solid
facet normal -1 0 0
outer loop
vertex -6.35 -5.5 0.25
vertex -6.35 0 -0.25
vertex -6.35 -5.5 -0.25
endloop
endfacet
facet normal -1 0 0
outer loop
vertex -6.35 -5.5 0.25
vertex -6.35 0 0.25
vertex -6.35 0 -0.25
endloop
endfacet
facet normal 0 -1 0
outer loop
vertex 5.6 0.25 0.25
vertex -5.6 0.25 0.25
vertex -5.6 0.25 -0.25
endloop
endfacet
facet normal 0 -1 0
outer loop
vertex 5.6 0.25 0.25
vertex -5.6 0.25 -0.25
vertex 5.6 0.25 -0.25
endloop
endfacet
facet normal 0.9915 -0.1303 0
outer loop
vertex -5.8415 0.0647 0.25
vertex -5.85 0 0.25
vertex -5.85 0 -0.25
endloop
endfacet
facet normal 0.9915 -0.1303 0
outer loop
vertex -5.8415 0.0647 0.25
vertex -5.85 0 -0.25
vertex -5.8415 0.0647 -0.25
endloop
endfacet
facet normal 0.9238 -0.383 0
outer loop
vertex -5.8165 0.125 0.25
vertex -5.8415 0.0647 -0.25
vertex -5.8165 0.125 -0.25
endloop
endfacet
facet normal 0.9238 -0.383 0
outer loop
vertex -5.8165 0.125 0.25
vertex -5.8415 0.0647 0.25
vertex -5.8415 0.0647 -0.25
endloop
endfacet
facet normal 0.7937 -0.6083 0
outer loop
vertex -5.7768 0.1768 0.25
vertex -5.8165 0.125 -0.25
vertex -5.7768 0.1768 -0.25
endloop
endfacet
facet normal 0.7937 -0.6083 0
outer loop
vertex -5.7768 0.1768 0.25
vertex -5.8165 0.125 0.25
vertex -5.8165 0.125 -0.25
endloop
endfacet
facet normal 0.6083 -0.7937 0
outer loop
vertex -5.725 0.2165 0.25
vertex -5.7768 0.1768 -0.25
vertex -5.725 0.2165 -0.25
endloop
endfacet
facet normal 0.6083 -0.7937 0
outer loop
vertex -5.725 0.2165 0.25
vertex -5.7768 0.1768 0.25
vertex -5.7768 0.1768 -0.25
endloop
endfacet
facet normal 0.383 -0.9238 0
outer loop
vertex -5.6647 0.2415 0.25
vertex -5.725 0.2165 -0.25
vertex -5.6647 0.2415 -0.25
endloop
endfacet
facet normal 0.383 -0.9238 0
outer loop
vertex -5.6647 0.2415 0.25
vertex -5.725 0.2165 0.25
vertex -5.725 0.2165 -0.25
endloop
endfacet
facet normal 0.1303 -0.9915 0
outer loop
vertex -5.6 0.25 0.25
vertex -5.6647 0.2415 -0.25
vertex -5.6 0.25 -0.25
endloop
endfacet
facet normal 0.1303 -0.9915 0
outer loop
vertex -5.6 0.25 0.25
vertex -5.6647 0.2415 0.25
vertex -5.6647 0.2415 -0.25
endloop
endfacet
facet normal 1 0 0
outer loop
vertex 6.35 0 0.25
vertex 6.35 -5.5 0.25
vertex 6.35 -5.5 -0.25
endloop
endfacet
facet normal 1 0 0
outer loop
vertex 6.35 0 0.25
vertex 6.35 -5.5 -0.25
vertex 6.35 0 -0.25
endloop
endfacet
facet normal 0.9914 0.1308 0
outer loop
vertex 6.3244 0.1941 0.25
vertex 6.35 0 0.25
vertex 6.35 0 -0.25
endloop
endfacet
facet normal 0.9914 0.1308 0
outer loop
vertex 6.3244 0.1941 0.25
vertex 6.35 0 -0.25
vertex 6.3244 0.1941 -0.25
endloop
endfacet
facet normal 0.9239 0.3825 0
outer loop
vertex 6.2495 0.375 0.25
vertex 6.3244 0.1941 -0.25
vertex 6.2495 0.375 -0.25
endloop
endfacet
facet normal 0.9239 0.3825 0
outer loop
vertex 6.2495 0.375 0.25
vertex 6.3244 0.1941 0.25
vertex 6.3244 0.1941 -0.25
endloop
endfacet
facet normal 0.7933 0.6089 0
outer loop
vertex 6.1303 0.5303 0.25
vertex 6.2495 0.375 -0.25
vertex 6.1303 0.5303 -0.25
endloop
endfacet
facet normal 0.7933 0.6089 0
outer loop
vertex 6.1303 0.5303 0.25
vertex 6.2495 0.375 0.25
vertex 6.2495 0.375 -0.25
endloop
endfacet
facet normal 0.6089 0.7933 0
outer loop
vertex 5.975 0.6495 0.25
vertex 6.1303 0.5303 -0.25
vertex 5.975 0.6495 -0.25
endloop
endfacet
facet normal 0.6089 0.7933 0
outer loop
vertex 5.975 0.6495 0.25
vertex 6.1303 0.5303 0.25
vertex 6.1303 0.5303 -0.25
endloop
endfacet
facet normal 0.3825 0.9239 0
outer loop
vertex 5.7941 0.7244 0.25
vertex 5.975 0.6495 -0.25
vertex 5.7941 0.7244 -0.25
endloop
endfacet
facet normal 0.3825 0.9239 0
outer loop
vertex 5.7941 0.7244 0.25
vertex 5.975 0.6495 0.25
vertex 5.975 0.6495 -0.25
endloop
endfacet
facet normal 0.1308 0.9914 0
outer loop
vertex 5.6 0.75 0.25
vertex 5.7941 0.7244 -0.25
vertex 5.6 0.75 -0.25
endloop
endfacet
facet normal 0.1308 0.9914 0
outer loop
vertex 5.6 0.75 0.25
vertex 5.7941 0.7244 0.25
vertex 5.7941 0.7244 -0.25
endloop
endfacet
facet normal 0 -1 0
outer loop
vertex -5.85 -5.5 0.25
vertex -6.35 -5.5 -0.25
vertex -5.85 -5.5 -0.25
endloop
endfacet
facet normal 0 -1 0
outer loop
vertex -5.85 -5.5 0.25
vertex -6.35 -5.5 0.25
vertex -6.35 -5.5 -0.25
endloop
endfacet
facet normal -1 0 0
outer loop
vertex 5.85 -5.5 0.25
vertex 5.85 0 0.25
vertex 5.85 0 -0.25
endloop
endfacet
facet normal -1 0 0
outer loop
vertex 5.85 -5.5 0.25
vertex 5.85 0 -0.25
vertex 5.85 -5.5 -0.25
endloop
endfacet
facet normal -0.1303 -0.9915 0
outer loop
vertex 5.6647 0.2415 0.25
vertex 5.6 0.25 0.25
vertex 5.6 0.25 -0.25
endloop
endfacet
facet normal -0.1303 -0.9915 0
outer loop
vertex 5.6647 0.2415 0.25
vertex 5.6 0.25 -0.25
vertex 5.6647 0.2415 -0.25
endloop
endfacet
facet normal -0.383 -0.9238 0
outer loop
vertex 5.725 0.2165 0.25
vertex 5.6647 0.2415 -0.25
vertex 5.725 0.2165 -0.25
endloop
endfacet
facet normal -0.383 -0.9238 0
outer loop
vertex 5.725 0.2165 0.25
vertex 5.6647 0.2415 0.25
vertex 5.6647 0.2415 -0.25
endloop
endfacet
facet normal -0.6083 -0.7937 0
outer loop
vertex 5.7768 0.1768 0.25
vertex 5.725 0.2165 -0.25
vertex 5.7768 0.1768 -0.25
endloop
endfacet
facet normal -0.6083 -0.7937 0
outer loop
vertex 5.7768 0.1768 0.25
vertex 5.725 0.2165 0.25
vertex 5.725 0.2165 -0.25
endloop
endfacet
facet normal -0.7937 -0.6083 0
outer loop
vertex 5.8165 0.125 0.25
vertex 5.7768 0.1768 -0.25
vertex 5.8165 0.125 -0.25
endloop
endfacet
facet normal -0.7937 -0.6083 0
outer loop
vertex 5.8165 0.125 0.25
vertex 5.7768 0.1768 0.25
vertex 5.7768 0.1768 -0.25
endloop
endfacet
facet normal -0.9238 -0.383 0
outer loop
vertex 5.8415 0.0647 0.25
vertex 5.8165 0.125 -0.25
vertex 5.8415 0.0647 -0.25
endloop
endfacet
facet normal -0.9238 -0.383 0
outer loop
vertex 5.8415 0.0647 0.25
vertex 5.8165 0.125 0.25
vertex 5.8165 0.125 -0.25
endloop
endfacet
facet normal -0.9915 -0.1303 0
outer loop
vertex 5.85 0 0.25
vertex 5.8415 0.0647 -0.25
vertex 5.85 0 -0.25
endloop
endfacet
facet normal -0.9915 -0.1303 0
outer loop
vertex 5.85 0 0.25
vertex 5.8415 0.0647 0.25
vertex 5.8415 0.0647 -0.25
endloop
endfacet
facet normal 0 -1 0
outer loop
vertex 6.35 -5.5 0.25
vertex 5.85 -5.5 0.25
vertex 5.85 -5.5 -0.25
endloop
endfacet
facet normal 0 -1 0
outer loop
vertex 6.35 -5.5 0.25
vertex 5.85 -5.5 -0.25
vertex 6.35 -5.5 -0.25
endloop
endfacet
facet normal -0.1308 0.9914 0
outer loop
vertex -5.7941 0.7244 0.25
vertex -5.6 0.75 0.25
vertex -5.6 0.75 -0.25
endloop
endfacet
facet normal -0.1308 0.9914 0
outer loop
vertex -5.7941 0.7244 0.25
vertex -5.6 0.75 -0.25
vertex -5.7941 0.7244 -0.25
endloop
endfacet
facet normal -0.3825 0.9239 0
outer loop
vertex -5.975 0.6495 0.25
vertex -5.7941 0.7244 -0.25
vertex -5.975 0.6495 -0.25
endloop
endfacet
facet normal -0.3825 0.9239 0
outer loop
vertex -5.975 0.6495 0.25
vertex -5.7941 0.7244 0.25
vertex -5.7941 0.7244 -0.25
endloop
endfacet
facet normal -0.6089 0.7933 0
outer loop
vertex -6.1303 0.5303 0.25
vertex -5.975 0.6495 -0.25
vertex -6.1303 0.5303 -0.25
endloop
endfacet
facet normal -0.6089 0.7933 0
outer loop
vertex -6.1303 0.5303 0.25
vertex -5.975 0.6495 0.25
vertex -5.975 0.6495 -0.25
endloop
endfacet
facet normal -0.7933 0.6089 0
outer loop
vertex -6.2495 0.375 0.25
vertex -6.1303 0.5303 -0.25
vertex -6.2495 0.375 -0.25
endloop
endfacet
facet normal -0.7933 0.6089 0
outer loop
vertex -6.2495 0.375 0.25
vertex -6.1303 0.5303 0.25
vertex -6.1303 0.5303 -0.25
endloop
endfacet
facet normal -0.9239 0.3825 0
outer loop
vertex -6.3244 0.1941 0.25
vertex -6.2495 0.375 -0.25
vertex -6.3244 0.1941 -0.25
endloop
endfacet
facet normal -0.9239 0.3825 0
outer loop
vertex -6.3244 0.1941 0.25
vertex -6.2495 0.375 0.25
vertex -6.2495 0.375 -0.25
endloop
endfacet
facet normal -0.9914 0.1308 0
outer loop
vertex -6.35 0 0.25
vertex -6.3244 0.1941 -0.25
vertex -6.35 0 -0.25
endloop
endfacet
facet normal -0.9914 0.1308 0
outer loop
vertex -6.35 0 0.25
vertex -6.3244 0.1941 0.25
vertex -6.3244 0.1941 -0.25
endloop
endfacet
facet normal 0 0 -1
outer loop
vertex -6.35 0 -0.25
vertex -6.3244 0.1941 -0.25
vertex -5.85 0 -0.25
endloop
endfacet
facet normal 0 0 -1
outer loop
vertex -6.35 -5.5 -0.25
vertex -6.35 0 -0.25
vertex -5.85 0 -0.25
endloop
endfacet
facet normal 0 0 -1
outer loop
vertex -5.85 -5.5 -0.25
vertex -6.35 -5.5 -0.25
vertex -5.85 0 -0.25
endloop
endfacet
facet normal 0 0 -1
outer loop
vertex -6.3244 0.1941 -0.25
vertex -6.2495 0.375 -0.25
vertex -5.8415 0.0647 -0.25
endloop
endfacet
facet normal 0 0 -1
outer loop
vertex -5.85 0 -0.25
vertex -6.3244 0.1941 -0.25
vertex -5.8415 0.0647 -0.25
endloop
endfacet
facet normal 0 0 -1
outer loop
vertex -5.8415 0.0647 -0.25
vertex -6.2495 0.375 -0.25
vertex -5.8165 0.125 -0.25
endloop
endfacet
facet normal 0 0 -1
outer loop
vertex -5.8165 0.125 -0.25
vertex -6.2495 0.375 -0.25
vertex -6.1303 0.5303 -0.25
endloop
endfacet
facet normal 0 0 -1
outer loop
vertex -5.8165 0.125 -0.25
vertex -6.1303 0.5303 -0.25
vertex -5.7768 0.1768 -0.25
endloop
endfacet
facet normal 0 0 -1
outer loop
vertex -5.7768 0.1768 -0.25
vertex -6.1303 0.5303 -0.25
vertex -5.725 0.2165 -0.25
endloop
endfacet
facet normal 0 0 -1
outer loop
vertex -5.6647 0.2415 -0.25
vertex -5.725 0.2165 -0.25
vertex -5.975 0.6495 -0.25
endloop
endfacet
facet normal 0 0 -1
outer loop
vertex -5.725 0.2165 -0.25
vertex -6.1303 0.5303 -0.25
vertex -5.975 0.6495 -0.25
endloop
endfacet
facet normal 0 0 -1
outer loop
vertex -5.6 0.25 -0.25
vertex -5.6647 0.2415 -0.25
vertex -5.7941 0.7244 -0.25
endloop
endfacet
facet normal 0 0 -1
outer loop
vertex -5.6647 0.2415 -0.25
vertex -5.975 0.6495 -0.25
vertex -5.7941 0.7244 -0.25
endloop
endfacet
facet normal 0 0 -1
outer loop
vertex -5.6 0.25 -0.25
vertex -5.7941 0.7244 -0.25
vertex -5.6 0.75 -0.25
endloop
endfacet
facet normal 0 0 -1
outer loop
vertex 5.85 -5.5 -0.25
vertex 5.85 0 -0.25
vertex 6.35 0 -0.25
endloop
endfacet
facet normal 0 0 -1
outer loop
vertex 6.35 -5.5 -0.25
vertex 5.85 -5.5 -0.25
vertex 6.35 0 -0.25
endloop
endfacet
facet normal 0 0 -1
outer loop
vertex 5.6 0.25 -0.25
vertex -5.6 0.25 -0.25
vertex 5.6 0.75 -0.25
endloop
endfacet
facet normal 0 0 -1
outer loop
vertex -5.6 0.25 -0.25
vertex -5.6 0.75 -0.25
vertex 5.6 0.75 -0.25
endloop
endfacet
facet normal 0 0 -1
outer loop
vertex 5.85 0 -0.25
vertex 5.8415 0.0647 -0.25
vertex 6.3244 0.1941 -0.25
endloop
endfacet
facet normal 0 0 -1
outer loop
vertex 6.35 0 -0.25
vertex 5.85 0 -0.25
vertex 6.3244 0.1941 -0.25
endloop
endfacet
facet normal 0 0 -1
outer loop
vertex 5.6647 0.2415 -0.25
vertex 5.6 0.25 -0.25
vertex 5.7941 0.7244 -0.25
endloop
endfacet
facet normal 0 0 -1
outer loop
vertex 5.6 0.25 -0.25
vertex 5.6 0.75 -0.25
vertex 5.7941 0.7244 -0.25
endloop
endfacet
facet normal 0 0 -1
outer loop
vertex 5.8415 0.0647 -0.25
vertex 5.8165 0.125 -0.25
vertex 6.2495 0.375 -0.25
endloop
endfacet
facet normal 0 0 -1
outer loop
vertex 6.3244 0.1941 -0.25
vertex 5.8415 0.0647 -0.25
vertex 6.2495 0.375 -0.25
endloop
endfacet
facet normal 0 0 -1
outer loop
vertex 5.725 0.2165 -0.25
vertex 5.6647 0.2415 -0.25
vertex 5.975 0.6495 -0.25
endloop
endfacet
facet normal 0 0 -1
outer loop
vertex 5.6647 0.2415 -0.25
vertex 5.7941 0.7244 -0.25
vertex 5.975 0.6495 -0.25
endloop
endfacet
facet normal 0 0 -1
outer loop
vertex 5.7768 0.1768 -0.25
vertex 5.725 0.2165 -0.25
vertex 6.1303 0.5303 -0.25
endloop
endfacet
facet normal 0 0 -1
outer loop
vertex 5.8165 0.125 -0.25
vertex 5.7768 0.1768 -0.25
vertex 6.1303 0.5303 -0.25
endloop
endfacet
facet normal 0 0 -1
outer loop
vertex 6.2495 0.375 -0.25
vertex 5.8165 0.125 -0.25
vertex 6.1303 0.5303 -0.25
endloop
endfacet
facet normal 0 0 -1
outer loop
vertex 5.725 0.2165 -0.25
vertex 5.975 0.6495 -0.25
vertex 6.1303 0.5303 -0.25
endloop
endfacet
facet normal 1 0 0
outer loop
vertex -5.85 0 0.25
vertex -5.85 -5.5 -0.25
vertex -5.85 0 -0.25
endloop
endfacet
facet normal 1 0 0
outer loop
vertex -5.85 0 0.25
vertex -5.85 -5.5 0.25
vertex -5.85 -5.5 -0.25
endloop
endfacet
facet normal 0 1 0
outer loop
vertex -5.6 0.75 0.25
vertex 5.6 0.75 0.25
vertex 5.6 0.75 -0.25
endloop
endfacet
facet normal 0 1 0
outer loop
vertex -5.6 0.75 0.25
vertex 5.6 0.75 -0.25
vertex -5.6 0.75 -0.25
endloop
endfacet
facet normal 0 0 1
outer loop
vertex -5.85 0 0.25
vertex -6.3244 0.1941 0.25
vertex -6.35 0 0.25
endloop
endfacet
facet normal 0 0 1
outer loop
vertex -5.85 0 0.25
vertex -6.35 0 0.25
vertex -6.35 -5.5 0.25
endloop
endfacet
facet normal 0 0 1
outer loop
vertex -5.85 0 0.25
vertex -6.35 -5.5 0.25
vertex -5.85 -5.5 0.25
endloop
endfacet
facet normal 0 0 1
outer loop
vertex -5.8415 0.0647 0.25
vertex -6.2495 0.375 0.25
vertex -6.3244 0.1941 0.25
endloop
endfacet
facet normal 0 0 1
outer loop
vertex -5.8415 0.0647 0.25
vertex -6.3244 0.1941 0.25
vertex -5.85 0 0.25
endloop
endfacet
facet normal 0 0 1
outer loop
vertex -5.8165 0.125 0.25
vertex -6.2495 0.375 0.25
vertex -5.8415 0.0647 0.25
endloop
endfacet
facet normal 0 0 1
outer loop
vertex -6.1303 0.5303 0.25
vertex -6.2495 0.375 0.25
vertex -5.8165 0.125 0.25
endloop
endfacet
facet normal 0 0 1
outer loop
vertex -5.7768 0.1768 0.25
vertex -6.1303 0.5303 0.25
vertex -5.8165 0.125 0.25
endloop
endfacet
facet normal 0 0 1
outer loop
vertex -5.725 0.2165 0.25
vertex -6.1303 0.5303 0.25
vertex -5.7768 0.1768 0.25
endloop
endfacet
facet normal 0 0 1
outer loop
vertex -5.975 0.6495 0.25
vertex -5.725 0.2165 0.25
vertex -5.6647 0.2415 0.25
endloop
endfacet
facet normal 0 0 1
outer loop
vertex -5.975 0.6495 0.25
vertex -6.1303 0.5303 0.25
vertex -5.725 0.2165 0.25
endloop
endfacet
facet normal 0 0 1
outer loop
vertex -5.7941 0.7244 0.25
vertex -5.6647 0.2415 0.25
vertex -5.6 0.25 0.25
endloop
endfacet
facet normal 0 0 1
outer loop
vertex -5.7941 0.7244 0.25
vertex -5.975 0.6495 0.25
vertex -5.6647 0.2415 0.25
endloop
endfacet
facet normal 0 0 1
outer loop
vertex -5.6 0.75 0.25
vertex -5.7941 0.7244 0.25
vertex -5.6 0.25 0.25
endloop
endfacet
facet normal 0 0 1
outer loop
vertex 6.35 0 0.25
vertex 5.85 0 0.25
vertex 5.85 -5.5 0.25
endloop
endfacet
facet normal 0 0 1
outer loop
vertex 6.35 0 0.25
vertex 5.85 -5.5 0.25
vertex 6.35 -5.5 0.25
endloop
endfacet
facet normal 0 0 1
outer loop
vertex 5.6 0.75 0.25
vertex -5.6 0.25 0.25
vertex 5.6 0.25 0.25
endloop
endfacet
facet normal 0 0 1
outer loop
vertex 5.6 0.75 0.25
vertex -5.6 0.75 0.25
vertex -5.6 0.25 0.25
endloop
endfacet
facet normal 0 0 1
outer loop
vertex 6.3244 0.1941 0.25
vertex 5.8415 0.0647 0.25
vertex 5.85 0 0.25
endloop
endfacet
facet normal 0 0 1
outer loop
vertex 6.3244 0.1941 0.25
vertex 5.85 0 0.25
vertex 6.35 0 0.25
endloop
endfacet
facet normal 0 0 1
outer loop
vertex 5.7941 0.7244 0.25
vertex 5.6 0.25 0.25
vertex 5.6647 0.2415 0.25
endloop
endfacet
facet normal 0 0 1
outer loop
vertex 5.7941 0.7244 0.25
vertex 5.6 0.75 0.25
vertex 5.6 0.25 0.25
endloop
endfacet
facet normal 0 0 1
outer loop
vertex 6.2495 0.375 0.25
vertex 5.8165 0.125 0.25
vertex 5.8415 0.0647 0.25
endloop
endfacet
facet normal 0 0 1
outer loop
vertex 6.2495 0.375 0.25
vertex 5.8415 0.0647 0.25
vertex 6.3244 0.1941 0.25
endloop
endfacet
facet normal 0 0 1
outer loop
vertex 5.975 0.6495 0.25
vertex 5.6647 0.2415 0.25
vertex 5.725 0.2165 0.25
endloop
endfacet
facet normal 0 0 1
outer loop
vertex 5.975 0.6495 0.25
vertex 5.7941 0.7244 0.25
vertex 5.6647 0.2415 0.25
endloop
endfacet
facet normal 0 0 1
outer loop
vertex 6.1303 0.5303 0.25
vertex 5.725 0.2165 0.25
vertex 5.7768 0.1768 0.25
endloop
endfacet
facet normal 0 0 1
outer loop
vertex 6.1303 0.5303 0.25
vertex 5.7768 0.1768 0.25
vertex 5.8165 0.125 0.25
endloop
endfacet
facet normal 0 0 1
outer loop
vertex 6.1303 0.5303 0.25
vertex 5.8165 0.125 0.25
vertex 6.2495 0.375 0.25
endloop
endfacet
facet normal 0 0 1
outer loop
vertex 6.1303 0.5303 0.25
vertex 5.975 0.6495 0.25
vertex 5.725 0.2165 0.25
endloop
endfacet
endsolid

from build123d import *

# Parameters (mm, degrees)
EXTRUDE_THIN2_DEPTH = 0.25


with BuildPart() as part:
    # Sketch1 → Extrude-Thin2 (new body, symmetric)
    with BuildSketch(Plane.XY):
        with BuildLine():
            Line((-5.85, -5.5), (-5.85, 0))
            ThreePointArc((-5.85, 0), (-5.776776695, 0.176776695), (-5.6, 0.25))
            Line((-5.6, 0.25), (5.6, 0.25))
            ThreePointArc((5.6, 0.25), (5.776776695, 0.176776695), (5.85, 0))
            Line((5.85, 0), (5.85, -5.5))
            Line((5.85, -5.5), (6.35, -5.5))
            Line((6.35, -5.5), (6.35, 0))
            ThreePointArc((6.35, 0), (6.130330086, 0.530330086), (5.6, 0.75))
            Line((5.6, 0.75), (-5.6, 0.75))
            ThreePointArc((-5.6, 0.75), (-6.130330086, 0.530330086), (-6.35, 0))
            Line((-6.35, 0), (-6.35, -5.5))
            Line((-6.35, -5.5), (-5.85, -5.5))
        make_face()
    extrude(amount=EXTRUDE_THIN2_DEPTH, both=True)


solid = part.part
